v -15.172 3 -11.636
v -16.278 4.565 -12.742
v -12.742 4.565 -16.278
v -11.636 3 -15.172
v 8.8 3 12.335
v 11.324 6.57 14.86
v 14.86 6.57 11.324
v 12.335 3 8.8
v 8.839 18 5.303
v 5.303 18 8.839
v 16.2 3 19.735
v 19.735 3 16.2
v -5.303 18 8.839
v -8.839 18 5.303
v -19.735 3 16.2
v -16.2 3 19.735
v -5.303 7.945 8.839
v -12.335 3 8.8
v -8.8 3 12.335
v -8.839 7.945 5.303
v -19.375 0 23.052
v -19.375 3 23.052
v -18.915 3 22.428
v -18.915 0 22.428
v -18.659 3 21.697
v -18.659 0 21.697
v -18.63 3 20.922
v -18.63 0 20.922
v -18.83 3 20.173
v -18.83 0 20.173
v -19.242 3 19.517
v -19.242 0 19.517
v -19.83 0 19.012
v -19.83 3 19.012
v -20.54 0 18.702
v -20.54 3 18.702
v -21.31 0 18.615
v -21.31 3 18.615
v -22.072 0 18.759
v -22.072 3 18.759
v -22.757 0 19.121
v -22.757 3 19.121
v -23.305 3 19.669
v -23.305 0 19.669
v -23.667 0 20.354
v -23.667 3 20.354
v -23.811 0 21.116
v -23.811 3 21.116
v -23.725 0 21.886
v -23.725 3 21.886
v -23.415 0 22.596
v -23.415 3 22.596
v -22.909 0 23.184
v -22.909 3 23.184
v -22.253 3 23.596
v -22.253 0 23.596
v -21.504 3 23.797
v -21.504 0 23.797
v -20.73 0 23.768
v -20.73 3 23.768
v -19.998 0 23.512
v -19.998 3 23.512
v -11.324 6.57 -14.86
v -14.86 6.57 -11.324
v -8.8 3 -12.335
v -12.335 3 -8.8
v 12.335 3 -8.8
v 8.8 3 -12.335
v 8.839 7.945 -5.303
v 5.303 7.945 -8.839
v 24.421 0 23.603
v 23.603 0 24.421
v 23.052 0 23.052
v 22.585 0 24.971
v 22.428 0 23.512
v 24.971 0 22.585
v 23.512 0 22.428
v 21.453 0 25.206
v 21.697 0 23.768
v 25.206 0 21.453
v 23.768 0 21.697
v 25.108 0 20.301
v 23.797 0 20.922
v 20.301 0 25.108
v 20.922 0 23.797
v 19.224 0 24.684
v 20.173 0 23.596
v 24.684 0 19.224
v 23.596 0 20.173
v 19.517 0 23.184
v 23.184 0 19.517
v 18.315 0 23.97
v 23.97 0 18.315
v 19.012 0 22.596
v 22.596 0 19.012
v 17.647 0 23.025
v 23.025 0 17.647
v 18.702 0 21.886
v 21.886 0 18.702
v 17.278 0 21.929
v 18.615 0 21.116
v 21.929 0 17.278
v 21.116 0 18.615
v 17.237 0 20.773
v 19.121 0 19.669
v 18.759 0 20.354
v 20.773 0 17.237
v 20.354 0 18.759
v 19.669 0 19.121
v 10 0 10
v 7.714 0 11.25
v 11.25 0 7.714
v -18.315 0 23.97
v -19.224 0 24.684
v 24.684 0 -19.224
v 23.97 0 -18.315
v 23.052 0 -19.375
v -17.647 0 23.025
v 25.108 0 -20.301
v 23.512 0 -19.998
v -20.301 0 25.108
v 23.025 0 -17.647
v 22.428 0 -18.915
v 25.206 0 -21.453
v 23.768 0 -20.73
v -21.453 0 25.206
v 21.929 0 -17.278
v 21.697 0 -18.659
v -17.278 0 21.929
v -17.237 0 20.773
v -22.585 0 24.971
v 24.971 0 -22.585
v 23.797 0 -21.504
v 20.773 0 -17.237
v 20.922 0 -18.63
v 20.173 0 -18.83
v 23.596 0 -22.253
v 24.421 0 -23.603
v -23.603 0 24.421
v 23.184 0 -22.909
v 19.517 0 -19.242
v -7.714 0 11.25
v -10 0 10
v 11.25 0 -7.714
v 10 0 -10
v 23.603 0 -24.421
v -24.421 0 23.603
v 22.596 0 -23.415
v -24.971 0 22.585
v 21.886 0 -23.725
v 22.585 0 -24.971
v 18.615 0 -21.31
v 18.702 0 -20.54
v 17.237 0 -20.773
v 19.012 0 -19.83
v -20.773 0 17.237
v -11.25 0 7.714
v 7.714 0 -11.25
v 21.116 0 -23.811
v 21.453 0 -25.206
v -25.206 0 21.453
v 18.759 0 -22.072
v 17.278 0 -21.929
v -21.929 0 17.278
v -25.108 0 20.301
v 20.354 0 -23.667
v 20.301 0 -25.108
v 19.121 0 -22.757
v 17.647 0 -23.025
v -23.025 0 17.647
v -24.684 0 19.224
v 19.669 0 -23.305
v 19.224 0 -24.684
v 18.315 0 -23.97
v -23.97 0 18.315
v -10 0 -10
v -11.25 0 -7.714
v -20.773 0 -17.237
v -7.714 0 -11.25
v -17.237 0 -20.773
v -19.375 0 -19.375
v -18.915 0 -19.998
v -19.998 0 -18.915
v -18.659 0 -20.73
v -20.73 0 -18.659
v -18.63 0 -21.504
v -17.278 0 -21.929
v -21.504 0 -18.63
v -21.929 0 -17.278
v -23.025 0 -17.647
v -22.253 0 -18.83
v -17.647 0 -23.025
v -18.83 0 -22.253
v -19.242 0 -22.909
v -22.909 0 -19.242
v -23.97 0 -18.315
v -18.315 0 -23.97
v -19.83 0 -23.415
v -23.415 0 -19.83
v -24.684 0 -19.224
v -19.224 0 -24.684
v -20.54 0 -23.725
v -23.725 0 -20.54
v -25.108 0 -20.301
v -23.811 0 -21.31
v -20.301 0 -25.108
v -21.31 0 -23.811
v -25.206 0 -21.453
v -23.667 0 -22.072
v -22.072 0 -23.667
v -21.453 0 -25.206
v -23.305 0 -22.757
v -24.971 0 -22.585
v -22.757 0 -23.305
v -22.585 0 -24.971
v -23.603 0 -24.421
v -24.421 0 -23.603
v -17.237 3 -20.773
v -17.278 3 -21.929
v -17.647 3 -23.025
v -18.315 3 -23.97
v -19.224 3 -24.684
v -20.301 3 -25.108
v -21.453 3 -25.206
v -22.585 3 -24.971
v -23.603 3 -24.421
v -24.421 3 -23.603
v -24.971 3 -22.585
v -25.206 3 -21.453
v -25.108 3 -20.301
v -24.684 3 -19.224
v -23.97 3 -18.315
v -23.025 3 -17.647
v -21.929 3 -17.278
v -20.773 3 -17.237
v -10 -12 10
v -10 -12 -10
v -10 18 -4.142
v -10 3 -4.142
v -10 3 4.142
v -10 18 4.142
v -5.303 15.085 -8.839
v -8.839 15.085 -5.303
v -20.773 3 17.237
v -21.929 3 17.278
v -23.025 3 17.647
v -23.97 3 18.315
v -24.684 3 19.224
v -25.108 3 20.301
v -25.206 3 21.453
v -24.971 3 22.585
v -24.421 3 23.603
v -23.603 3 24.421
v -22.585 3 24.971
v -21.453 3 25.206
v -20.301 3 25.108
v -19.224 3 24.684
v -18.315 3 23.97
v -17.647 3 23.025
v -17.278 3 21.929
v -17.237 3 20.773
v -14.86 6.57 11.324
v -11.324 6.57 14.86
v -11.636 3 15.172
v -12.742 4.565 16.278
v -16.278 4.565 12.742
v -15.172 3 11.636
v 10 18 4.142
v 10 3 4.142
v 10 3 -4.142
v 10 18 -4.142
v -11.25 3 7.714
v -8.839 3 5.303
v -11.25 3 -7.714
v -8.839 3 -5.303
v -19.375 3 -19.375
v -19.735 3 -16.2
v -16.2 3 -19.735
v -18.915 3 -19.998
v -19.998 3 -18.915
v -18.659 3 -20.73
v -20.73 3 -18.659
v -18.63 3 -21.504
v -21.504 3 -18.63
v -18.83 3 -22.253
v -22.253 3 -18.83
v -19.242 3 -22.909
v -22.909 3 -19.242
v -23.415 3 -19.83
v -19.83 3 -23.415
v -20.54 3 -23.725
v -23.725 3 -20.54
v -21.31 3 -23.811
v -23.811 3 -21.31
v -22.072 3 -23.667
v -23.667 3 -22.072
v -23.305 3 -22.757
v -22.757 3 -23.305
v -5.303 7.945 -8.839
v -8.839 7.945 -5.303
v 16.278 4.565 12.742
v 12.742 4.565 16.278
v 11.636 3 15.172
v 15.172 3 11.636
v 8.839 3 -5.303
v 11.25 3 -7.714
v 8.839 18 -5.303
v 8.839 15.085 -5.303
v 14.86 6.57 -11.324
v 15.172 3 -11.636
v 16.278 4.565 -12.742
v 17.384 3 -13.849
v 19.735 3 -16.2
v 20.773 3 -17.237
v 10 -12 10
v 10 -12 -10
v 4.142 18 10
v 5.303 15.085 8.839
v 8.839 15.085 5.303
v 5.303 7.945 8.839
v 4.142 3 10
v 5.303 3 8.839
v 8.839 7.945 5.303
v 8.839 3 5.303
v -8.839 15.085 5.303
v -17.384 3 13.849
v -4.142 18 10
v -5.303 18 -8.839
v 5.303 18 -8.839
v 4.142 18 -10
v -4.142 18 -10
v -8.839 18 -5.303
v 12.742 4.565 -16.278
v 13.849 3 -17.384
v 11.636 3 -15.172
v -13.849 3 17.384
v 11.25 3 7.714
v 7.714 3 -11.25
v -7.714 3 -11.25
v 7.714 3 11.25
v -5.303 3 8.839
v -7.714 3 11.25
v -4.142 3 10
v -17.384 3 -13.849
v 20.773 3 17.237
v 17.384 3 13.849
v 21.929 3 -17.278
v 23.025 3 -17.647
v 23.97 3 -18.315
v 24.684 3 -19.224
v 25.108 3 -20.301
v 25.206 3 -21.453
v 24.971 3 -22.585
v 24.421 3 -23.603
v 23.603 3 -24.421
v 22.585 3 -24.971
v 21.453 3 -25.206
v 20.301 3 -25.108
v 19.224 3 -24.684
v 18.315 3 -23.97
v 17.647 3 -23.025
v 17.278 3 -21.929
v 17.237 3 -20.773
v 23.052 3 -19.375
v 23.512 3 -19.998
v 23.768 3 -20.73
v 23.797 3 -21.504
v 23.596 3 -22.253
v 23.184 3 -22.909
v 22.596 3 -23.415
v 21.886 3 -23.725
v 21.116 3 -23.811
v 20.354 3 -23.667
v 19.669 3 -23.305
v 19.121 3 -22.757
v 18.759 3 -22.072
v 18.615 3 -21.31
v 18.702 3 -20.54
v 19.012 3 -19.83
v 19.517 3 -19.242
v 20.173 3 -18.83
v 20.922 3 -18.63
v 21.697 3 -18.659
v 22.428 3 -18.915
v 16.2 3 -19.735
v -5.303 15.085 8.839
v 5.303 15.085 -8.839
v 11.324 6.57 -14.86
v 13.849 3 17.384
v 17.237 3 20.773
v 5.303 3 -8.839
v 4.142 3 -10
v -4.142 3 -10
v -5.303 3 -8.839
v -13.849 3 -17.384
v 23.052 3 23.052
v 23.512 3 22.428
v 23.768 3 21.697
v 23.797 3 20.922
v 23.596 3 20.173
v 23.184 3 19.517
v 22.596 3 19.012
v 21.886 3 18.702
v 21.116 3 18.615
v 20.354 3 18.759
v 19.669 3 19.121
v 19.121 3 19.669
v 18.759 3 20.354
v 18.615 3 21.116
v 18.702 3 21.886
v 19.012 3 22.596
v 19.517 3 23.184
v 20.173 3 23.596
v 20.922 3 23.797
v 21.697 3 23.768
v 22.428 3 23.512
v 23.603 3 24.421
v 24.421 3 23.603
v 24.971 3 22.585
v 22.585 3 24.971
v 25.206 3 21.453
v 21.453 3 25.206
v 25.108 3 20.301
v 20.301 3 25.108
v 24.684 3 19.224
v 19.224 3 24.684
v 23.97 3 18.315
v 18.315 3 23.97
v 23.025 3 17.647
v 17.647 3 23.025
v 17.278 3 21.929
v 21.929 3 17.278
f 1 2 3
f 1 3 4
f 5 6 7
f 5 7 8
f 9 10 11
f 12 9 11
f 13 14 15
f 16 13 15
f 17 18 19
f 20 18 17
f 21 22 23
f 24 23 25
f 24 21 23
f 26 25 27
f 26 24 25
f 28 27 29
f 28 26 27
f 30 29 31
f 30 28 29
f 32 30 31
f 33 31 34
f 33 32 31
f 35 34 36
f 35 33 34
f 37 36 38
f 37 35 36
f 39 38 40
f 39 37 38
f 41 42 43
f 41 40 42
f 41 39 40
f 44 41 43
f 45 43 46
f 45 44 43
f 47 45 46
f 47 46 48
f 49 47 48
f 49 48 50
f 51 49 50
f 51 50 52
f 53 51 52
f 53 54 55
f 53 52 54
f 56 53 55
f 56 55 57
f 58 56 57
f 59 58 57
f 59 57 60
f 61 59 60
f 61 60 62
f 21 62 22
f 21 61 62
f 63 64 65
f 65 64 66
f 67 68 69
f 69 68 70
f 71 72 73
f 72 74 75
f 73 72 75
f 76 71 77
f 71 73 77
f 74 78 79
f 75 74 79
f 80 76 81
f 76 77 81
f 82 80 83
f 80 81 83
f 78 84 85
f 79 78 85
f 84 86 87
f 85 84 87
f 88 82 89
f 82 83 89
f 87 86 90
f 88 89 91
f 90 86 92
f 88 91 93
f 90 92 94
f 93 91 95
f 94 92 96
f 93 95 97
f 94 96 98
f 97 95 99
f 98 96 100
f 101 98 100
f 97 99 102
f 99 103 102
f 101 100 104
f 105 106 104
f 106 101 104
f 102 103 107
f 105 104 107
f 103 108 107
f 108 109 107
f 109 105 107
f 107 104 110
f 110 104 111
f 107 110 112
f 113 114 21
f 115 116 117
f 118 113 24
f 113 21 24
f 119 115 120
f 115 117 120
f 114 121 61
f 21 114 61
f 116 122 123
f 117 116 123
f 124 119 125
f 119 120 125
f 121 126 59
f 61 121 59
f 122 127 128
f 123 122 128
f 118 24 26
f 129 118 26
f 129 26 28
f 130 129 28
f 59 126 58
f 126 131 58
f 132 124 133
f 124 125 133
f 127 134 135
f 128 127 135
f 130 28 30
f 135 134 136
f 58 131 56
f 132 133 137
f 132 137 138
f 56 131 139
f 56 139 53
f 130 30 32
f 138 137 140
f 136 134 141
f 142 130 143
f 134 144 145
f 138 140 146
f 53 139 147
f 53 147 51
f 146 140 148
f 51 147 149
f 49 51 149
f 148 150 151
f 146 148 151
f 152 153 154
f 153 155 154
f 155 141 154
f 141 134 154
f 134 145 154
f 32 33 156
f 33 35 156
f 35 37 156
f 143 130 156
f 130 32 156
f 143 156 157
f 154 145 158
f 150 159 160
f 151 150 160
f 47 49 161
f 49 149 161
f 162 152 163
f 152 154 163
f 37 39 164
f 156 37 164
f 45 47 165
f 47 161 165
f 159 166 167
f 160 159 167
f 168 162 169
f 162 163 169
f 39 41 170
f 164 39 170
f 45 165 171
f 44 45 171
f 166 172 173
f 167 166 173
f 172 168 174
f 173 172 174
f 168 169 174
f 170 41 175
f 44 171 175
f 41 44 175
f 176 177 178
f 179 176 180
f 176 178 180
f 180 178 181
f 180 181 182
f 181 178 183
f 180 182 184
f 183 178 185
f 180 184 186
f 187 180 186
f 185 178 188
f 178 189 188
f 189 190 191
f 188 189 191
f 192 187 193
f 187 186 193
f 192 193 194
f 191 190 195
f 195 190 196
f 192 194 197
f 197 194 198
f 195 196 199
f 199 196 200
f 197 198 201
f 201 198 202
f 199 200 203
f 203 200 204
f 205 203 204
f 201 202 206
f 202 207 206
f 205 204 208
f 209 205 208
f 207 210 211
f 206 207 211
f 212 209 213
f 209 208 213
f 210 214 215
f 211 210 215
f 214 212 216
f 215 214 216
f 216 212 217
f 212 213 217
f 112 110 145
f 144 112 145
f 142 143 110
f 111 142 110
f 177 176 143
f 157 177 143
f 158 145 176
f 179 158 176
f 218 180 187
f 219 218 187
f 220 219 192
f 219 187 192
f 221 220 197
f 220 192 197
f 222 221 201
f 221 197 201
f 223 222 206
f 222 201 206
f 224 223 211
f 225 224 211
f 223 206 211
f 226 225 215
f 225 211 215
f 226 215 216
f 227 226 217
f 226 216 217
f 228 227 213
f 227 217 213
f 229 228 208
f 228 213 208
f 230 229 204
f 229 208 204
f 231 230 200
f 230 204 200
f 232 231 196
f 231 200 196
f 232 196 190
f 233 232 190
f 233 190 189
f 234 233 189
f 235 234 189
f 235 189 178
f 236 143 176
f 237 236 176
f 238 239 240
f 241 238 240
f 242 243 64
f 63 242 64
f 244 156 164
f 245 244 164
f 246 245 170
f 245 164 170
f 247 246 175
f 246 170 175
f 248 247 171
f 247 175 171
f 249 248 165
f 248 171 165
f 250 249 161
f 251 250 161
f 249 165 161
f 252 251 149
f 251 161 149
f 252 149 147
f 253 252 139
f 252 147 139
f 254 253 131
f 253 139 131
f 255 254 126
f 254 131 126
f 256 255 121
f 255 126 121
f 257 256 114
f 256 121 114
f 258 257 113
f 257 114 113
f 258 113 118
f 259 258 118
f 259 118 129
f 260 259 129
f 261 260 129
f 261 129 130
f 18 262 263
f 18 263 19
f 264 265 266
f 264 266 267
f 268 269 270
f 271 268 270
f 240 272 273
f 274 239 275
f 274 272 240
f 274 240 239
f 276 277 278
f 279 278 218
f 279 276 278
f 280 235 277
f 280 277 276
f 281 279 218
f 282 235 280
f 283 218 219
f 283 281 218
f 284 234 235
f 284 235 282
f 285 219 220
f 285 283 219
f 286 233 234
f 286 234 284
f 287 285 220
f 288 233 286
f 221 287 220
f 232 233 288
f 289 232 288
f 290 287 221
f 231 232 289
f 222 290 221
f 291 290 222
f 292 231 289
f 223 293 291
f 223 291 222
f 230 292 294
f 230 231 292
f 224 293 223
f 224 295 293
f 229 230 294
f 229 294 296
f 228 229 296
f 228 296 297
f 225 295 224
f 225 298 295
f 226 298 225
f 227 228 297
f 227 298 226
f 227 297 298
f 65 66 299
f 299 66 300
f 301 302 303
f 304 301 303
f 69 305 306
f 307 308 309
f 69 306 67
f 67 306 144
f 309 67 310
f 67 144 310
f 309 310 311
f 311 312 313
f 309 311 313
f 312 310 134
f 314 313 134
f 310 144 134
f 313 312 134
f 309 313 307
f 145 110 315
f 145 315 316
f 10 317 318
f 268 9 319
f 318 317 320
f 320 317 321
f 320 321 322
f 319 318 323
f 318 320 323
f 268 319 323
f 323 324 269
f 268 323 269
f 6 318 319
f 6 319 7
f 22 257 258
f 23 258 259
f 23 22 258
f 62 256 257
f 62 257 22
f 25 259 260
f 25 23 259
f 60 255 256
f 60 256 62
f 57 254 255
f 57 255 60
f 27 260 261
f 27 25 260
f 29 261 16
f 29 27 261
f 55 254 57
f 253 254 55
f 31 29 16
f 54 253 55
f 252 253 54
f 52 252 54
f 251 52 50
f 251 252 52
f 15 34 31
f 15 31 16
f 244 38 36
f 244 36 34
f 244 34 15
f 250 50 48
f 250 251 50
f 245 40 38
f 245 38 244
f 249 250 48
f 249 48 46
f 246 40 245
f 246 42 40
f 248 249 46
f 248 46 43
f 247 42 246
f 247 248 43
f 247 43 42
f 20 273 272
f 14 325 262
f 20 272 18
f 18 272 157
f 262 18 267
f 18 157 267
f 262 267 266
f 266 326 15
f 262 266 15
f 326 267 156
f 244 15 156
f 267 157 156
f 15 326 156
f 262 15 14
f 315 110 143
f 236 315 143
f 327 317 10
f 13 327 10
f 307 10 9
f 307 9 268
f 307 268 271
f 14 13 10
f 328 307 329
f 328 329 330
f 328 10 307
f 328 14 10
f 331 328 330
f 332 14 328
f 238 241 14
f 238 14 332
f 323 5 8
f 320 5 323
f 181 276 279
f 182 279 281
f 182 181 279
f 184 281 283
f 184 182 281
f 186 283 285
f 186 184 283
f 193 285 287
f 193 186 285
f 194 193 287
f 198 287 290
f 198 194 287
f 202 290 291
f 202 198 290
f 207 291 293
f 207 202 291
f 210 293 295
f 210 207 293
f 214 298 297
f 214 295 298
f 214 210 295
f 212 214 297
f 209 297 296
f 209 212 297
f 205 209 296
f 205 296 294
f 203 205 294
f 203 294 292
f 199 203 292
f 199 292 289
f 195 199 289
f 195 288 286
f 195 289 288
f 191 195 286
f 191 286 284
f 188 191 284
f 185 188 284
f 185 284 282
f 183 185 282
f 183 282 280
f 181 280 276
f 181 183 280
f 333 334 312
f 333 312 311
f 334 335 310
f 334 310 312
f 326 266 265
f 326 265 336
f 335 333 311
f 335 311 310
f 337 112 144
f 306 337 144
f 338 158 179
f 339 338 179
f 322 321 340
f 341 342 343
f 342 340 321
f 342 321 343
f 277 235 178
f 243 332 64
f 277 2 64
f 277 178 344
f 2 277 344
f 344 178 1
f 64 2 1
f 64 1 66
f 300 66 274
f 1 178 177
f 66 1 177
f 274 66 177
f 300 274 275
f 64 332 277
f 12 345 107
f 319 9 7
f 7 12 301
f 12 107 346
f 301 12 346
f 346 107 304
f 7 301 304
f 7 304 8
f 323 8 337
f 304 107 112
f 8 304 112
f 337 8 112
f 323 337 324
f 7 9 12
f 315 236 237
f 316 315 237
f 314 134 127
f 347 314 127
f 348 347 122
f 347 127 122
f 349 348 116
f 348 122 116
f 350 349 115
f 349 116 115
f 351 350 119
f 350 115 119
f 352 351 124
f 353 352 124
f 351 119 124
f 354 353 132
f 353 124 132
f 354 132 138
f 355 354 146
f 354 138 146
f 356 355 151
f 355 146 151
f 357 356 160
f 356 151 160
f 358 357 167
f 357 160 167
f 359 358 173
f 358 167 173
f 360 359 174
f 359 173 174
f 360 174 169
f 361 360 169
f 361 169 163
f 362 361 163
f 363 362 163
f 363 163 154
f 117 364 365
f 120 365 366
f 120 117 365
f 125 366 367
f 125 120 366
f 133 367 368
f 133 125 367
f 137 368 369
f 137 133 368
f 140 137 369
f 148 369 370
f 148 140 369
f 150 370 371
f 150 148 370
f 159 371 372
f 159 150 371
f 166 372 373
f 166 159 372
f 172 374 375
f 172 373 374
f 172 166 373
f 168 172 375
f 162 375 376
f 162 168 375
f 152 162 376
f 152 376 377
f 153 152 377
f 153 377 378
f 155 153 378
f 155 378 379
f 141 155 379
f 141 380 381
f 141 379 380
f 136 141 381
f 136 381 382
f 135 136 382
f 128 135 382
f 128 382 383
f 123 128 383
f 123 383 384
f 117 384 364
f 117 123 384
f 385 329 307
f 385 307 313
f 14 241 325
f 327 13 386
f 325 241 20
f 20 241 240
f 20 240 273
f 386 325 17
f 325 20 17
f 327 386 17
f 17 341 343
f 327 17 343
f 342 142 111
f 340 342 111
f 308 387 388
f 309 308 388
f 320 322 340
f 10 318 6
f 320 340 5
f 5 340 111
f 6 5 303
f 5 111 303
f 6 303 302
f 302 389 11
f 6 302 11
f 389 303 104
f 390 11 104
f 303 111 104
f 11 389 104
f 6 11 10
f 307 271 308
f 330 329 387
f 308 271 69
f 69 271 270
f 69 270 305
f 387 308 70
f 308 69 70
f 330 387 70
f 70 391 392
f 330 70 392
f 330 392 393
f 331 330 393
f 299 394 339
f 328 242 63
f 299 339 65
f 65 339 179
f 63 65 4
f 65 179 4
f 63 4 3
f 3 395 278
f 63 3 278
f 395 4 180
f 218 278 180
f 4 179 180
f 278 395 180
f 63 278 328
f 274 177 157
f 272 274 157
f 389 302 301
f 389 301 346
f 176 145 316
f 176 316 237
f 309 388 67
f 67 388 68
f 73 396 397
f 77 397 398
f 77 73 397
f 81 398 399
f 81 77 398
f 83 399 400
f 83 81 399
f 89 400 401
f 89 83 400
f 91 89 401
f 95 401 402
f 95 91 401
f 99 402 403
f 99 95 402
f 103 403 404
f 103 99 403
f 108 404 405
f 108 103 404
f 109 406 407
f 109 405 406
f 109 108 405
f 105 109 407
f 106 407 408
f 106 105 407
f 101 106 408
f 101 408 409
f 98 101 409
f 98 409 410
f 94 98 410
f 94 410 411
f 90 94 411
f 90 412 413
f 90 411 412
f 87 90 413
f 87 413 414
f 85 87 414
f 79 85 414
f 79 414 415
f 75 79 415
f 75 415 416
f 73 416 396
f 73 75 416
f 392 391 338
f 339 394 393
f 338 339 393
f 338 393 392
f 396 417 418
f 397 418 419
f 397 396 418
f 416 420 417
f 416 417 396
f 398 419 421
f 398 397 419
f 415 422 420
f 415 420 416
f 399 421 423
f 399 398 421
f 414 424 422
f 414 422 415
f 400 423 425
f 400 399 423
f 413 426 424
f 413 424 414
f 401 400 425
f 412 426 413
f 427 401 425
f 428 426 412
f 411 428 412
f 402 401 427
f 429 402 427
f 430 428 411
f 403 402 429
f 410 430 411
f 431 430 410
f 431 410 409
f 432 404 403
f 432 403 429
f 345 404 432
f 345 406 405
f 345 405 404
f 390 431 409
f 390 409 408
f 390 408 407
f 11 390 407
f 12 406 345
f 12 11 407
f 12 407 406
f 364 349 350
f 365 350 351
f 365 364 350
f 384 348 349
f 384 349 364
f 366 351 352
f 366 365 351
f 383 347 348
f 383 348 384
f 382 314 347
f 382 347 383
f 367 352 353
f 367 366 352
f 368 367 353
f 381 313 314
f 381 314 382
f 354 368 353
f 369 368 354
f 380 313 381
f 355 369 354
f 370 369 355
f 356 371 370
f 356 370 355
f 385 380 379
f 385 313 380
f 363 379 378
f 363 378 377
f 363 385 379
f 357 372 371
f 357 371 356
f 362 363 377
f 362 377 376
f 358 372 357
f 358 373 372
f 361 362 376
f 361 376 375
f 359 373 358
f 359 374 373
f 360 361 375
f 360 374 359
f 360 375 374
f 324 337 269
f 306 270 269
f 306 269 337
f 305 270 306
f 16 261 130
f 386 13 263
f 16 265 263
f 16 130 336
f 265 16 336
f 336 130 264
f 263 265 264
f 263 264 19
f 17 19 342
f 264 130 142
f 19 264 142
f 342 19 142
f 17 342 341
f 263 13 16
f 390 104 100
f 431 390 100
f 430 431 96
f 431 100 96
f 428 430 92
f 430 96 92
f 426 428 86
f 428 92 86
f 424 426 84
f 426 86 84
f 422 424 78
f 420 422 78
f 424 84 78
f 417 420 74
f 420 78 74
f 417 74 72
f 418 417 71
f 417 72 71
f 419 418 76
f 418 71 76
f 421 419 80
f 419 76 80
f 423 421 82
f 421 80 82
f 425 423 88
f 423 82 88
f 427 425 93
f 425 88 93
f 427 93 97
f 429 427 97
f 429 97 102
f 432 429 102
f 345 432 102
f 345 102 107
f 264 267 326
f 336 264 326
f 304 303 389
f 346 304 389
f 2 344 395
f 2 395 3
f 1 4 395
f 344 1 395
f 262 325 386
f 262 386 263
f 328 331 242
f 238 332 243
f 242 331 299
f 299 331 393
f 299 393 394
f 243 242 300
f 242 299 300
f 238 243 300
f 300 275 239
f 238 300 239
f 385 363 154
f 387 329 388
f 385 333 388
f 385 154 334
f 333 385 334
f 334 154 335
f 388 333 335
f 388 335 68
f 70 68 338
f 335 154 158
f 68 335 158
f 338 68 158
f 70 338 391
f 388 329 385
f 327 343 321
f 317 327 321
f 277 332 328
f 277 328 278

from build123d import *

# Parameters (mm, degrees)
SKETCH1_W               = 20
SKETCH1_H               = 20
BOSS_EXTRUDE1_DEPTH     = 12
BOSS_EXTRUDE2_DEPTH     = 3
BOSS_EXTRUDE3_DEPTH     = 15
BOSS_EXTRUDE4_DEPTH     = 15
BODY_MOVE_COPY1_ANGLE   = 45
CUT_EXTRUDE2_DEPTH      = 15
CUT_EXTRUDE2_DEPTH_BACK = 15
CUT_EXTRUDE3_DEPTH      = 15
CUT_EXTRUDE3_DEPTH_BACK = 15
CUT_EXTRUDE4_DEPTH      = 15
CUT_EXTRUDE4_DEPTH_BACK = 15
CUT_EXTRUDE5_DEPTH      = 15
CUT_EXTRUDE5_DEPTH_BACK = 15
SKETCH10_R              = 2.6
CUT_EXTRUDE6_DEPTH      = 25
BODY_MOVE_COPY2_ANGLE   = 45


with BuildPart() as part:
    # Sketch1 → Boss-Extrude1 (new body)
    with BuildSketch(Plane(origin=(0, 0, 0), x_dir=(1, 0, 0), z_dir=(0, 1, 0))):
        Rectangle(SKETCH1_W, SKETCH1_H)
    extrude(amount=-BOSS_EXTRUDE1_DEPTH)

    # Sketch2 → Boss-Extrude2 (add)
    with BuildSketch(Plane(origin=(0, 0, 0), x_dir=(1, 0, 0), z_dir=(0, 1, 0))):
        with BuildLine():
            Line((7.714466094, -11.25), (17.237496266, -20.773030172))
            ThreePointArc((17.237496266, -20.773030172), (24.04163056, -24.04163056), (20.773030172, -17.237496266))
            Line((20.773030172, -17.237496266), (11.25, -7.714466094))
            Line((11.25, -7.714466094), (11.25, 7.714466094))
            Line((11.25, 7.714466094), (20.773030172, 17.237496266))
            ThreePointArc((20.773030172, 17.237496266), (24.04163056, 24.04163056), (17.237496266, 20.773030172))
            Line((17.237496266, 20.773030172), (7.714466094, 11.25))
            Line((7.714466094, 11.25), (-7.714466094, 11.25))
            Line((-7.714466094, 11.25), (-17.237496266, 20.773030172))
            ThreePointArc((-17.237496266, 20.773030172), (-24.04163056, 24.04163056), (-20.773030172, 17.237496266))
            Line((-20.773030172, 17.237496266), (-11.25, 7.714466094))
            Line((-11.25, 7.714466094), (-11.25, -7.714466094))
            Line((-11.25, -7.714466094), (-20.773030172, -17.237496266))
            ThreePointArc((-20.773030172, -17.237496266), (-24.04163056, -24.04163056), (-17.237496266, -20.773030172))
            Line((-17.237496266, -20.773030172), (-7.714466094, -11.25))
            Line((-7.714466094, -11.25), (7.714466094, -11.25))
        make_face()
    extrude(amount=BOSS_EXTRUDE2_DEPTH)

    # Sketch3 → Boss-Extrude3 (add)
    with BuildSketch(Plane(origin=(0, 3, 0), x_dir=(1, 0, 0), z_dir=(0, 1, 0))):
        Polygon((10, 4.142135624), (4.142135624, 10), (-4.142135624, 10), (-10, 4.142135624), (-10, -4.142135624), (-4.142135624, -10), (4.142135624, -10), (10, -4.142135624), align=None)
    extrude(amount=BOSS_EXTRUDE3_DEPTH)

    # Sketch4 → Boss-Extrude4 (add)
    with BuildSketch(Plane(origin=(0, 3, 0), x_dir=(1, 0, 0), z_dir=(0, 1, 0))):
        Polygon((-11.25, -7.714466094), (-19.735281374, -16.199747468), (-16.199747468, -19.735281374), (-7.714466094, -11.25), (-5.303300859, -8.838834765), (-8.838834765, -5.303300859), align=None)
        Polygon((-7.714466094, 11.25), (-16.199747468, 19.735281374), (-19.735281374, 16.199747468), (-11.25, 7.714466094), (-8.838834765, 5.303300859), (-5.303300859, 8.838834765), align=None)
        Polygon((11.25, 7.714466094), (19.735281374, 16.199747468), (16.199747468, 19.735281374), (7.714466094, 11.25), (5.303300859, 8.838834765), (8.838834765, 5.303300859), align=None)
        Polygon((7.714466094, -11.25), (16.199747468, -19.735281374), (19.735281374, -16.199747468), (11.25, -7.714466094), (8.838834765, -5.303300859), (5.303300859, -8.838834765), align=None)
    extrude(amount=BOSS_EXTRUDE4_DEPTH)


with BuildPart() as part_1:
    # Body-Move/Copy1: moved
    add(part.part.rotate(Axis((0, 0, 0), (0, 1, 0)), BODY_MOVE_COPY1_ANGLE))

    # Sketch5 → Cut-Extrude2 (cut, two sides: drawn at the far end of the back side and taken through both)
    with BuildSketch(Plane.XY.offset(-CUT_EXTRUDE2_DEPTH_BACK)):
        Polygon((-25.409902577, 18), (-10, 18), (-25.409902577, 3), align=None)
        Polygon((10, 18), (25.409902577, 3), (25.409902577, 18), align=None)
    extrude(amount=CUT_EXTRUDE2_DEPTH + CUT_EXTRUDE2_DEPTH_BACK, mode=Mode.SUBTRACT)

    # Sketch7 → Cut-Extrude3 (cut, two sides: drawn at the far end of the back side and taken through both)
    with BuildSketch(Plane(origin=(0, 0, 0), x_dir=(0, 0, -1), z_dir=(1, 0, 0)).offset(-CUT_EXTRUDE3_DEPTH_BACK)):
        Polygon((-25.409902577, 18), (-10, 18), (-25.409902577, 3), align=None)
        Polygon((10, 18), (25.409902577, 3), (25.409902577, 18), align=None)
    extrude(amount=CUT_EXTRUDE3_DEPTH + CUT_EXTRUDE3_DEPTH_BACK, mode=Mode.SUBTRACT)

    # Sketch8 → Cut-Extrude4 (cut, two sides: drawn at the far end of the back side and taken through both)
    with BuildSketch(Plane(origin=(2.5, 0, 0), x_dir=(0, 0, -1), z_dir=(1, 0, 0)).offset(-CUT_EXTRUDE4_DEPTH_BACK)):
        Polygon((-10, 7.94465349), (-10, 15.084865647), (-18.514759568, 6.570106079), (-14.94465349, 3), align=None)
        Polygon((-18.955808103, 3), (-22.084865647, 3), (-20.674172955, 4.410692692), (-20.520336875, 4.564528772), align=None)
        Polygon((14.94465349, 3), (10, 7.94465349), (10, 15.084865647), (18.514759568, 6.570106079), align=None)
        Polygon((20.674172955, 4.410692692), (20.520336875, 4.564528772), (18.955808103, 3), (22.084865647, 3), align=None)
    extrude(amount=CUT_EXTRUDE4_DEPTH + CUT_EXTRUDE4_DEPTH_BACK, mode=Mode.SUBTRACT)

    # Sketch9 → Cut-Extrude5 (cut, two sides: drawn at the far end of the back side and taken through both)
    with BuildSketch(Plane.XY.offset(-CUT_EXTRUDE5_DEPTH_BACK)):
        Polygon((-10, 7.94465349), (-10, 15.084865647), (-18.514759568, 6.570106079), (-14.94465349, 3), align=None)
        Polygon((-18.955808103, 3), (-22.084865647, 3), (-20.674172955, 4.410692692), (-20.520336875, 4.564528772), align=None)
        Polygon((14.94465349, 3), (10, 7.94465349), (10, 15.084865647), (18.514759568, 6.570106079), align=None)
        Polygon((20.674172955, 4.410692692), (20.520336875, 4.564528772), (18.955808103, 3), (22.084865647, 3), align=None)
    extrude(amount=CUT_EXTRUDE5_DEPTH + CUT_EXTRUDE5_DEPTH_BACK, mode=Mode.SUBTRACT)

    # Sketch10 → Cut-Extrude6 (cut)
    with BuildSketch(Plane(origin=(0, 0, 0), x_dir=(1, 0, 0), z_dir=(0, 1, 0))):
        with Locations(Location((0, -30, 0), (0, 0, 270))):
            Circle(SKETCH10_R)
        with Locations(Location((-30, 0, 0), (0, 0, 270))):
            Circle(SKETCH10_R)
        with Locations(Location((0, 30, 0), (0, 0, 270))):
            Circle(SKETCH10_R)
        with Locations(Location((30, 0, 0), (0, 0, 270))):
            Circle(SKETCH10_R)
    extrude(amount=CUT_EXTRUDE6_DEPTH, mode=Mode.SUBTRACT)


with BuildPart() as part_2:
    # Body-Move/Copy2: moved
    add(part_1.part.rotate(Axis((0, 0, 0), (0, 1, 0)), BODY_MOVE_COPY2_ANGLE))


solid = part_2.part
